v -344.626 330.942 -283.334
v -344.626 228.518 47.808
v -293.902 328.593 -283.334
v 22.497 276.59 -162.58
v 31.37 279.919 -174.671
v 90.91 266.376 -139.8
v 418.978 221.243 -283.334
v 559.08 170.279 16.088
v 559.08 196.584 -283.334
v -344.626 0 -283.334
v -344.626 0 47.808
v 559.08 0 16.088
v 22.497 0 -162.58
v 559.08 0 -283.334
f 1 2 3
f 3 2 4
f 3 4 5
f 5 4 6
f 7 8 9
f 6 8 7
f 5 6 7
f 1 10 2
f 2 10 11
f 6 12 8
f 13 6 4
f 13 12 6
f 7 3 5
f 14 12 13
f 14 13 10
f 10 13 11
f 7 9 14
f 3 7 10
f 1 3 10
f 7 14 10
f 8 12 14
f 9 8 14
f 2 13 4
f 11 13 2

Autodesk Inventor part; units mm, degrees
ref_plane "YZ Plane" through (0, 0, 0) normal (1, 0, 0) x (0, 1, 0)
ref_plane "XZ Plane" through (0, 0, 0) normal (0, 1, 0) x (-1, 0, 0)
ref_plane "XY Plane" through (0, 0, 0) normal (0, 0, 1) x (1, 0, 0)
sketch "スケッチ5" plane through (0, 0, 0) normal (0, 1, 0) x (-1, 0, 0)
  line L0 (-559.0798, 16.0883) -> (-559.0798, -283.3342)
  line L1 (-559.0798, -283.3342) -> (344.6263, -283.3342)
  line L2 (344.6263, -283.3342) -> (344.6263, 47.8084)
  line L3 (-559.0798, 16.0883) -> (-22.4967, -162.5803)
  line L4 (-22.4967, -162.5803) -> (344.6263, 47.8084)
  point P0 (0, 0)
extrude "押し出し5" add sketch "スケッチ5" along normal blind 360
sketch3d "3D スケッチ1"
ref_plane "作業平面1" through (557.1342, 171.5665, 5.3514) normal (0.1727, 0.9812, 0.0862) x (-0.2514, 0.1285, -0.9593)
ref_plane "作業平面4" through (-344.5976, 233.5337, 31.5954) normal (-0.0442, -0.9544, -0.2952) x (-0.0031, 0.2956, -0.9553)
ref_plane "作業平面5" through (-345.6786, 336.3426, -300.6801) normal (0.1489, 0.9888, -0.0028) x (0.9391, -0.1406, 0.3137)
sketch "スケッチ6" plane through (557.1342, 171.5665, 5.3514) normal (0.1727, 0.9812, 0.0862) x (-0.2514, 0.1285, -0.9593)
  line L0 (-514.7241, -766.6326) -> (967.6123, -766.6326)
  line L1 (967.6123, -766.6326) -> (967.6123, 1684.2947)
  line L2 (967.6123, 1684.2947) -> (-514.7241, 1684.2947)
  line L3 (-514.7241, 1684.2947) -> (-514.7241, -766.6326)
  point P0 (123.1359, 504.4343)
sketch "スケッチ7" plane through (-345.6786, 336.3426, -300.6801) normal (0.1489, 0.9888, -0.0028) x (0.9391, -0.1406, 0.3137)
  line L0 (2221.5026, -667.2238) -> (-1676.0607, -667.2238)
  line L1 (-1676.0607, -667.2238) -> (-1676.0607, 746.6169)
  line L2 (-1676.0607, 746.6169) -> (2221.5026, 746.6169)
  line L3 (2221.5026, 746.6169) -> (2221.5026, -667.2238)
  point P0 (466.2154, -161.8023)
sketch "スケッチ8" plane through (-344.5976, 233.5337, 31.5954) normal (-0.0442, -0.9544, -0.2952) x (-0.0031, 0.2956, -0.9553)
  line L0 (-1292.5456, 2575.2008) -> (1231.0674, 2575.2008)
  line L1 (1231.0674, 2575.2008) -> (1231.0674, -1866.358)
  line L2 (1231.0674, -1866.358) -> (-1292.5456, -1866.358)
  line L3 (-1292.5456, -1866.358) -> (-1292.5456, 2575.2008)
  point P0 (-39.9159, 354.4214)
extrude "押し出し6" cut sketch "スケッチ7" along normal blind 360
extrude "押し出し7" cut sketch "スケッチ8" against normal blind 360
extrude "押し出し8" cut sketch "スケッチ6" along normal blind 360
properties part number "wall"
